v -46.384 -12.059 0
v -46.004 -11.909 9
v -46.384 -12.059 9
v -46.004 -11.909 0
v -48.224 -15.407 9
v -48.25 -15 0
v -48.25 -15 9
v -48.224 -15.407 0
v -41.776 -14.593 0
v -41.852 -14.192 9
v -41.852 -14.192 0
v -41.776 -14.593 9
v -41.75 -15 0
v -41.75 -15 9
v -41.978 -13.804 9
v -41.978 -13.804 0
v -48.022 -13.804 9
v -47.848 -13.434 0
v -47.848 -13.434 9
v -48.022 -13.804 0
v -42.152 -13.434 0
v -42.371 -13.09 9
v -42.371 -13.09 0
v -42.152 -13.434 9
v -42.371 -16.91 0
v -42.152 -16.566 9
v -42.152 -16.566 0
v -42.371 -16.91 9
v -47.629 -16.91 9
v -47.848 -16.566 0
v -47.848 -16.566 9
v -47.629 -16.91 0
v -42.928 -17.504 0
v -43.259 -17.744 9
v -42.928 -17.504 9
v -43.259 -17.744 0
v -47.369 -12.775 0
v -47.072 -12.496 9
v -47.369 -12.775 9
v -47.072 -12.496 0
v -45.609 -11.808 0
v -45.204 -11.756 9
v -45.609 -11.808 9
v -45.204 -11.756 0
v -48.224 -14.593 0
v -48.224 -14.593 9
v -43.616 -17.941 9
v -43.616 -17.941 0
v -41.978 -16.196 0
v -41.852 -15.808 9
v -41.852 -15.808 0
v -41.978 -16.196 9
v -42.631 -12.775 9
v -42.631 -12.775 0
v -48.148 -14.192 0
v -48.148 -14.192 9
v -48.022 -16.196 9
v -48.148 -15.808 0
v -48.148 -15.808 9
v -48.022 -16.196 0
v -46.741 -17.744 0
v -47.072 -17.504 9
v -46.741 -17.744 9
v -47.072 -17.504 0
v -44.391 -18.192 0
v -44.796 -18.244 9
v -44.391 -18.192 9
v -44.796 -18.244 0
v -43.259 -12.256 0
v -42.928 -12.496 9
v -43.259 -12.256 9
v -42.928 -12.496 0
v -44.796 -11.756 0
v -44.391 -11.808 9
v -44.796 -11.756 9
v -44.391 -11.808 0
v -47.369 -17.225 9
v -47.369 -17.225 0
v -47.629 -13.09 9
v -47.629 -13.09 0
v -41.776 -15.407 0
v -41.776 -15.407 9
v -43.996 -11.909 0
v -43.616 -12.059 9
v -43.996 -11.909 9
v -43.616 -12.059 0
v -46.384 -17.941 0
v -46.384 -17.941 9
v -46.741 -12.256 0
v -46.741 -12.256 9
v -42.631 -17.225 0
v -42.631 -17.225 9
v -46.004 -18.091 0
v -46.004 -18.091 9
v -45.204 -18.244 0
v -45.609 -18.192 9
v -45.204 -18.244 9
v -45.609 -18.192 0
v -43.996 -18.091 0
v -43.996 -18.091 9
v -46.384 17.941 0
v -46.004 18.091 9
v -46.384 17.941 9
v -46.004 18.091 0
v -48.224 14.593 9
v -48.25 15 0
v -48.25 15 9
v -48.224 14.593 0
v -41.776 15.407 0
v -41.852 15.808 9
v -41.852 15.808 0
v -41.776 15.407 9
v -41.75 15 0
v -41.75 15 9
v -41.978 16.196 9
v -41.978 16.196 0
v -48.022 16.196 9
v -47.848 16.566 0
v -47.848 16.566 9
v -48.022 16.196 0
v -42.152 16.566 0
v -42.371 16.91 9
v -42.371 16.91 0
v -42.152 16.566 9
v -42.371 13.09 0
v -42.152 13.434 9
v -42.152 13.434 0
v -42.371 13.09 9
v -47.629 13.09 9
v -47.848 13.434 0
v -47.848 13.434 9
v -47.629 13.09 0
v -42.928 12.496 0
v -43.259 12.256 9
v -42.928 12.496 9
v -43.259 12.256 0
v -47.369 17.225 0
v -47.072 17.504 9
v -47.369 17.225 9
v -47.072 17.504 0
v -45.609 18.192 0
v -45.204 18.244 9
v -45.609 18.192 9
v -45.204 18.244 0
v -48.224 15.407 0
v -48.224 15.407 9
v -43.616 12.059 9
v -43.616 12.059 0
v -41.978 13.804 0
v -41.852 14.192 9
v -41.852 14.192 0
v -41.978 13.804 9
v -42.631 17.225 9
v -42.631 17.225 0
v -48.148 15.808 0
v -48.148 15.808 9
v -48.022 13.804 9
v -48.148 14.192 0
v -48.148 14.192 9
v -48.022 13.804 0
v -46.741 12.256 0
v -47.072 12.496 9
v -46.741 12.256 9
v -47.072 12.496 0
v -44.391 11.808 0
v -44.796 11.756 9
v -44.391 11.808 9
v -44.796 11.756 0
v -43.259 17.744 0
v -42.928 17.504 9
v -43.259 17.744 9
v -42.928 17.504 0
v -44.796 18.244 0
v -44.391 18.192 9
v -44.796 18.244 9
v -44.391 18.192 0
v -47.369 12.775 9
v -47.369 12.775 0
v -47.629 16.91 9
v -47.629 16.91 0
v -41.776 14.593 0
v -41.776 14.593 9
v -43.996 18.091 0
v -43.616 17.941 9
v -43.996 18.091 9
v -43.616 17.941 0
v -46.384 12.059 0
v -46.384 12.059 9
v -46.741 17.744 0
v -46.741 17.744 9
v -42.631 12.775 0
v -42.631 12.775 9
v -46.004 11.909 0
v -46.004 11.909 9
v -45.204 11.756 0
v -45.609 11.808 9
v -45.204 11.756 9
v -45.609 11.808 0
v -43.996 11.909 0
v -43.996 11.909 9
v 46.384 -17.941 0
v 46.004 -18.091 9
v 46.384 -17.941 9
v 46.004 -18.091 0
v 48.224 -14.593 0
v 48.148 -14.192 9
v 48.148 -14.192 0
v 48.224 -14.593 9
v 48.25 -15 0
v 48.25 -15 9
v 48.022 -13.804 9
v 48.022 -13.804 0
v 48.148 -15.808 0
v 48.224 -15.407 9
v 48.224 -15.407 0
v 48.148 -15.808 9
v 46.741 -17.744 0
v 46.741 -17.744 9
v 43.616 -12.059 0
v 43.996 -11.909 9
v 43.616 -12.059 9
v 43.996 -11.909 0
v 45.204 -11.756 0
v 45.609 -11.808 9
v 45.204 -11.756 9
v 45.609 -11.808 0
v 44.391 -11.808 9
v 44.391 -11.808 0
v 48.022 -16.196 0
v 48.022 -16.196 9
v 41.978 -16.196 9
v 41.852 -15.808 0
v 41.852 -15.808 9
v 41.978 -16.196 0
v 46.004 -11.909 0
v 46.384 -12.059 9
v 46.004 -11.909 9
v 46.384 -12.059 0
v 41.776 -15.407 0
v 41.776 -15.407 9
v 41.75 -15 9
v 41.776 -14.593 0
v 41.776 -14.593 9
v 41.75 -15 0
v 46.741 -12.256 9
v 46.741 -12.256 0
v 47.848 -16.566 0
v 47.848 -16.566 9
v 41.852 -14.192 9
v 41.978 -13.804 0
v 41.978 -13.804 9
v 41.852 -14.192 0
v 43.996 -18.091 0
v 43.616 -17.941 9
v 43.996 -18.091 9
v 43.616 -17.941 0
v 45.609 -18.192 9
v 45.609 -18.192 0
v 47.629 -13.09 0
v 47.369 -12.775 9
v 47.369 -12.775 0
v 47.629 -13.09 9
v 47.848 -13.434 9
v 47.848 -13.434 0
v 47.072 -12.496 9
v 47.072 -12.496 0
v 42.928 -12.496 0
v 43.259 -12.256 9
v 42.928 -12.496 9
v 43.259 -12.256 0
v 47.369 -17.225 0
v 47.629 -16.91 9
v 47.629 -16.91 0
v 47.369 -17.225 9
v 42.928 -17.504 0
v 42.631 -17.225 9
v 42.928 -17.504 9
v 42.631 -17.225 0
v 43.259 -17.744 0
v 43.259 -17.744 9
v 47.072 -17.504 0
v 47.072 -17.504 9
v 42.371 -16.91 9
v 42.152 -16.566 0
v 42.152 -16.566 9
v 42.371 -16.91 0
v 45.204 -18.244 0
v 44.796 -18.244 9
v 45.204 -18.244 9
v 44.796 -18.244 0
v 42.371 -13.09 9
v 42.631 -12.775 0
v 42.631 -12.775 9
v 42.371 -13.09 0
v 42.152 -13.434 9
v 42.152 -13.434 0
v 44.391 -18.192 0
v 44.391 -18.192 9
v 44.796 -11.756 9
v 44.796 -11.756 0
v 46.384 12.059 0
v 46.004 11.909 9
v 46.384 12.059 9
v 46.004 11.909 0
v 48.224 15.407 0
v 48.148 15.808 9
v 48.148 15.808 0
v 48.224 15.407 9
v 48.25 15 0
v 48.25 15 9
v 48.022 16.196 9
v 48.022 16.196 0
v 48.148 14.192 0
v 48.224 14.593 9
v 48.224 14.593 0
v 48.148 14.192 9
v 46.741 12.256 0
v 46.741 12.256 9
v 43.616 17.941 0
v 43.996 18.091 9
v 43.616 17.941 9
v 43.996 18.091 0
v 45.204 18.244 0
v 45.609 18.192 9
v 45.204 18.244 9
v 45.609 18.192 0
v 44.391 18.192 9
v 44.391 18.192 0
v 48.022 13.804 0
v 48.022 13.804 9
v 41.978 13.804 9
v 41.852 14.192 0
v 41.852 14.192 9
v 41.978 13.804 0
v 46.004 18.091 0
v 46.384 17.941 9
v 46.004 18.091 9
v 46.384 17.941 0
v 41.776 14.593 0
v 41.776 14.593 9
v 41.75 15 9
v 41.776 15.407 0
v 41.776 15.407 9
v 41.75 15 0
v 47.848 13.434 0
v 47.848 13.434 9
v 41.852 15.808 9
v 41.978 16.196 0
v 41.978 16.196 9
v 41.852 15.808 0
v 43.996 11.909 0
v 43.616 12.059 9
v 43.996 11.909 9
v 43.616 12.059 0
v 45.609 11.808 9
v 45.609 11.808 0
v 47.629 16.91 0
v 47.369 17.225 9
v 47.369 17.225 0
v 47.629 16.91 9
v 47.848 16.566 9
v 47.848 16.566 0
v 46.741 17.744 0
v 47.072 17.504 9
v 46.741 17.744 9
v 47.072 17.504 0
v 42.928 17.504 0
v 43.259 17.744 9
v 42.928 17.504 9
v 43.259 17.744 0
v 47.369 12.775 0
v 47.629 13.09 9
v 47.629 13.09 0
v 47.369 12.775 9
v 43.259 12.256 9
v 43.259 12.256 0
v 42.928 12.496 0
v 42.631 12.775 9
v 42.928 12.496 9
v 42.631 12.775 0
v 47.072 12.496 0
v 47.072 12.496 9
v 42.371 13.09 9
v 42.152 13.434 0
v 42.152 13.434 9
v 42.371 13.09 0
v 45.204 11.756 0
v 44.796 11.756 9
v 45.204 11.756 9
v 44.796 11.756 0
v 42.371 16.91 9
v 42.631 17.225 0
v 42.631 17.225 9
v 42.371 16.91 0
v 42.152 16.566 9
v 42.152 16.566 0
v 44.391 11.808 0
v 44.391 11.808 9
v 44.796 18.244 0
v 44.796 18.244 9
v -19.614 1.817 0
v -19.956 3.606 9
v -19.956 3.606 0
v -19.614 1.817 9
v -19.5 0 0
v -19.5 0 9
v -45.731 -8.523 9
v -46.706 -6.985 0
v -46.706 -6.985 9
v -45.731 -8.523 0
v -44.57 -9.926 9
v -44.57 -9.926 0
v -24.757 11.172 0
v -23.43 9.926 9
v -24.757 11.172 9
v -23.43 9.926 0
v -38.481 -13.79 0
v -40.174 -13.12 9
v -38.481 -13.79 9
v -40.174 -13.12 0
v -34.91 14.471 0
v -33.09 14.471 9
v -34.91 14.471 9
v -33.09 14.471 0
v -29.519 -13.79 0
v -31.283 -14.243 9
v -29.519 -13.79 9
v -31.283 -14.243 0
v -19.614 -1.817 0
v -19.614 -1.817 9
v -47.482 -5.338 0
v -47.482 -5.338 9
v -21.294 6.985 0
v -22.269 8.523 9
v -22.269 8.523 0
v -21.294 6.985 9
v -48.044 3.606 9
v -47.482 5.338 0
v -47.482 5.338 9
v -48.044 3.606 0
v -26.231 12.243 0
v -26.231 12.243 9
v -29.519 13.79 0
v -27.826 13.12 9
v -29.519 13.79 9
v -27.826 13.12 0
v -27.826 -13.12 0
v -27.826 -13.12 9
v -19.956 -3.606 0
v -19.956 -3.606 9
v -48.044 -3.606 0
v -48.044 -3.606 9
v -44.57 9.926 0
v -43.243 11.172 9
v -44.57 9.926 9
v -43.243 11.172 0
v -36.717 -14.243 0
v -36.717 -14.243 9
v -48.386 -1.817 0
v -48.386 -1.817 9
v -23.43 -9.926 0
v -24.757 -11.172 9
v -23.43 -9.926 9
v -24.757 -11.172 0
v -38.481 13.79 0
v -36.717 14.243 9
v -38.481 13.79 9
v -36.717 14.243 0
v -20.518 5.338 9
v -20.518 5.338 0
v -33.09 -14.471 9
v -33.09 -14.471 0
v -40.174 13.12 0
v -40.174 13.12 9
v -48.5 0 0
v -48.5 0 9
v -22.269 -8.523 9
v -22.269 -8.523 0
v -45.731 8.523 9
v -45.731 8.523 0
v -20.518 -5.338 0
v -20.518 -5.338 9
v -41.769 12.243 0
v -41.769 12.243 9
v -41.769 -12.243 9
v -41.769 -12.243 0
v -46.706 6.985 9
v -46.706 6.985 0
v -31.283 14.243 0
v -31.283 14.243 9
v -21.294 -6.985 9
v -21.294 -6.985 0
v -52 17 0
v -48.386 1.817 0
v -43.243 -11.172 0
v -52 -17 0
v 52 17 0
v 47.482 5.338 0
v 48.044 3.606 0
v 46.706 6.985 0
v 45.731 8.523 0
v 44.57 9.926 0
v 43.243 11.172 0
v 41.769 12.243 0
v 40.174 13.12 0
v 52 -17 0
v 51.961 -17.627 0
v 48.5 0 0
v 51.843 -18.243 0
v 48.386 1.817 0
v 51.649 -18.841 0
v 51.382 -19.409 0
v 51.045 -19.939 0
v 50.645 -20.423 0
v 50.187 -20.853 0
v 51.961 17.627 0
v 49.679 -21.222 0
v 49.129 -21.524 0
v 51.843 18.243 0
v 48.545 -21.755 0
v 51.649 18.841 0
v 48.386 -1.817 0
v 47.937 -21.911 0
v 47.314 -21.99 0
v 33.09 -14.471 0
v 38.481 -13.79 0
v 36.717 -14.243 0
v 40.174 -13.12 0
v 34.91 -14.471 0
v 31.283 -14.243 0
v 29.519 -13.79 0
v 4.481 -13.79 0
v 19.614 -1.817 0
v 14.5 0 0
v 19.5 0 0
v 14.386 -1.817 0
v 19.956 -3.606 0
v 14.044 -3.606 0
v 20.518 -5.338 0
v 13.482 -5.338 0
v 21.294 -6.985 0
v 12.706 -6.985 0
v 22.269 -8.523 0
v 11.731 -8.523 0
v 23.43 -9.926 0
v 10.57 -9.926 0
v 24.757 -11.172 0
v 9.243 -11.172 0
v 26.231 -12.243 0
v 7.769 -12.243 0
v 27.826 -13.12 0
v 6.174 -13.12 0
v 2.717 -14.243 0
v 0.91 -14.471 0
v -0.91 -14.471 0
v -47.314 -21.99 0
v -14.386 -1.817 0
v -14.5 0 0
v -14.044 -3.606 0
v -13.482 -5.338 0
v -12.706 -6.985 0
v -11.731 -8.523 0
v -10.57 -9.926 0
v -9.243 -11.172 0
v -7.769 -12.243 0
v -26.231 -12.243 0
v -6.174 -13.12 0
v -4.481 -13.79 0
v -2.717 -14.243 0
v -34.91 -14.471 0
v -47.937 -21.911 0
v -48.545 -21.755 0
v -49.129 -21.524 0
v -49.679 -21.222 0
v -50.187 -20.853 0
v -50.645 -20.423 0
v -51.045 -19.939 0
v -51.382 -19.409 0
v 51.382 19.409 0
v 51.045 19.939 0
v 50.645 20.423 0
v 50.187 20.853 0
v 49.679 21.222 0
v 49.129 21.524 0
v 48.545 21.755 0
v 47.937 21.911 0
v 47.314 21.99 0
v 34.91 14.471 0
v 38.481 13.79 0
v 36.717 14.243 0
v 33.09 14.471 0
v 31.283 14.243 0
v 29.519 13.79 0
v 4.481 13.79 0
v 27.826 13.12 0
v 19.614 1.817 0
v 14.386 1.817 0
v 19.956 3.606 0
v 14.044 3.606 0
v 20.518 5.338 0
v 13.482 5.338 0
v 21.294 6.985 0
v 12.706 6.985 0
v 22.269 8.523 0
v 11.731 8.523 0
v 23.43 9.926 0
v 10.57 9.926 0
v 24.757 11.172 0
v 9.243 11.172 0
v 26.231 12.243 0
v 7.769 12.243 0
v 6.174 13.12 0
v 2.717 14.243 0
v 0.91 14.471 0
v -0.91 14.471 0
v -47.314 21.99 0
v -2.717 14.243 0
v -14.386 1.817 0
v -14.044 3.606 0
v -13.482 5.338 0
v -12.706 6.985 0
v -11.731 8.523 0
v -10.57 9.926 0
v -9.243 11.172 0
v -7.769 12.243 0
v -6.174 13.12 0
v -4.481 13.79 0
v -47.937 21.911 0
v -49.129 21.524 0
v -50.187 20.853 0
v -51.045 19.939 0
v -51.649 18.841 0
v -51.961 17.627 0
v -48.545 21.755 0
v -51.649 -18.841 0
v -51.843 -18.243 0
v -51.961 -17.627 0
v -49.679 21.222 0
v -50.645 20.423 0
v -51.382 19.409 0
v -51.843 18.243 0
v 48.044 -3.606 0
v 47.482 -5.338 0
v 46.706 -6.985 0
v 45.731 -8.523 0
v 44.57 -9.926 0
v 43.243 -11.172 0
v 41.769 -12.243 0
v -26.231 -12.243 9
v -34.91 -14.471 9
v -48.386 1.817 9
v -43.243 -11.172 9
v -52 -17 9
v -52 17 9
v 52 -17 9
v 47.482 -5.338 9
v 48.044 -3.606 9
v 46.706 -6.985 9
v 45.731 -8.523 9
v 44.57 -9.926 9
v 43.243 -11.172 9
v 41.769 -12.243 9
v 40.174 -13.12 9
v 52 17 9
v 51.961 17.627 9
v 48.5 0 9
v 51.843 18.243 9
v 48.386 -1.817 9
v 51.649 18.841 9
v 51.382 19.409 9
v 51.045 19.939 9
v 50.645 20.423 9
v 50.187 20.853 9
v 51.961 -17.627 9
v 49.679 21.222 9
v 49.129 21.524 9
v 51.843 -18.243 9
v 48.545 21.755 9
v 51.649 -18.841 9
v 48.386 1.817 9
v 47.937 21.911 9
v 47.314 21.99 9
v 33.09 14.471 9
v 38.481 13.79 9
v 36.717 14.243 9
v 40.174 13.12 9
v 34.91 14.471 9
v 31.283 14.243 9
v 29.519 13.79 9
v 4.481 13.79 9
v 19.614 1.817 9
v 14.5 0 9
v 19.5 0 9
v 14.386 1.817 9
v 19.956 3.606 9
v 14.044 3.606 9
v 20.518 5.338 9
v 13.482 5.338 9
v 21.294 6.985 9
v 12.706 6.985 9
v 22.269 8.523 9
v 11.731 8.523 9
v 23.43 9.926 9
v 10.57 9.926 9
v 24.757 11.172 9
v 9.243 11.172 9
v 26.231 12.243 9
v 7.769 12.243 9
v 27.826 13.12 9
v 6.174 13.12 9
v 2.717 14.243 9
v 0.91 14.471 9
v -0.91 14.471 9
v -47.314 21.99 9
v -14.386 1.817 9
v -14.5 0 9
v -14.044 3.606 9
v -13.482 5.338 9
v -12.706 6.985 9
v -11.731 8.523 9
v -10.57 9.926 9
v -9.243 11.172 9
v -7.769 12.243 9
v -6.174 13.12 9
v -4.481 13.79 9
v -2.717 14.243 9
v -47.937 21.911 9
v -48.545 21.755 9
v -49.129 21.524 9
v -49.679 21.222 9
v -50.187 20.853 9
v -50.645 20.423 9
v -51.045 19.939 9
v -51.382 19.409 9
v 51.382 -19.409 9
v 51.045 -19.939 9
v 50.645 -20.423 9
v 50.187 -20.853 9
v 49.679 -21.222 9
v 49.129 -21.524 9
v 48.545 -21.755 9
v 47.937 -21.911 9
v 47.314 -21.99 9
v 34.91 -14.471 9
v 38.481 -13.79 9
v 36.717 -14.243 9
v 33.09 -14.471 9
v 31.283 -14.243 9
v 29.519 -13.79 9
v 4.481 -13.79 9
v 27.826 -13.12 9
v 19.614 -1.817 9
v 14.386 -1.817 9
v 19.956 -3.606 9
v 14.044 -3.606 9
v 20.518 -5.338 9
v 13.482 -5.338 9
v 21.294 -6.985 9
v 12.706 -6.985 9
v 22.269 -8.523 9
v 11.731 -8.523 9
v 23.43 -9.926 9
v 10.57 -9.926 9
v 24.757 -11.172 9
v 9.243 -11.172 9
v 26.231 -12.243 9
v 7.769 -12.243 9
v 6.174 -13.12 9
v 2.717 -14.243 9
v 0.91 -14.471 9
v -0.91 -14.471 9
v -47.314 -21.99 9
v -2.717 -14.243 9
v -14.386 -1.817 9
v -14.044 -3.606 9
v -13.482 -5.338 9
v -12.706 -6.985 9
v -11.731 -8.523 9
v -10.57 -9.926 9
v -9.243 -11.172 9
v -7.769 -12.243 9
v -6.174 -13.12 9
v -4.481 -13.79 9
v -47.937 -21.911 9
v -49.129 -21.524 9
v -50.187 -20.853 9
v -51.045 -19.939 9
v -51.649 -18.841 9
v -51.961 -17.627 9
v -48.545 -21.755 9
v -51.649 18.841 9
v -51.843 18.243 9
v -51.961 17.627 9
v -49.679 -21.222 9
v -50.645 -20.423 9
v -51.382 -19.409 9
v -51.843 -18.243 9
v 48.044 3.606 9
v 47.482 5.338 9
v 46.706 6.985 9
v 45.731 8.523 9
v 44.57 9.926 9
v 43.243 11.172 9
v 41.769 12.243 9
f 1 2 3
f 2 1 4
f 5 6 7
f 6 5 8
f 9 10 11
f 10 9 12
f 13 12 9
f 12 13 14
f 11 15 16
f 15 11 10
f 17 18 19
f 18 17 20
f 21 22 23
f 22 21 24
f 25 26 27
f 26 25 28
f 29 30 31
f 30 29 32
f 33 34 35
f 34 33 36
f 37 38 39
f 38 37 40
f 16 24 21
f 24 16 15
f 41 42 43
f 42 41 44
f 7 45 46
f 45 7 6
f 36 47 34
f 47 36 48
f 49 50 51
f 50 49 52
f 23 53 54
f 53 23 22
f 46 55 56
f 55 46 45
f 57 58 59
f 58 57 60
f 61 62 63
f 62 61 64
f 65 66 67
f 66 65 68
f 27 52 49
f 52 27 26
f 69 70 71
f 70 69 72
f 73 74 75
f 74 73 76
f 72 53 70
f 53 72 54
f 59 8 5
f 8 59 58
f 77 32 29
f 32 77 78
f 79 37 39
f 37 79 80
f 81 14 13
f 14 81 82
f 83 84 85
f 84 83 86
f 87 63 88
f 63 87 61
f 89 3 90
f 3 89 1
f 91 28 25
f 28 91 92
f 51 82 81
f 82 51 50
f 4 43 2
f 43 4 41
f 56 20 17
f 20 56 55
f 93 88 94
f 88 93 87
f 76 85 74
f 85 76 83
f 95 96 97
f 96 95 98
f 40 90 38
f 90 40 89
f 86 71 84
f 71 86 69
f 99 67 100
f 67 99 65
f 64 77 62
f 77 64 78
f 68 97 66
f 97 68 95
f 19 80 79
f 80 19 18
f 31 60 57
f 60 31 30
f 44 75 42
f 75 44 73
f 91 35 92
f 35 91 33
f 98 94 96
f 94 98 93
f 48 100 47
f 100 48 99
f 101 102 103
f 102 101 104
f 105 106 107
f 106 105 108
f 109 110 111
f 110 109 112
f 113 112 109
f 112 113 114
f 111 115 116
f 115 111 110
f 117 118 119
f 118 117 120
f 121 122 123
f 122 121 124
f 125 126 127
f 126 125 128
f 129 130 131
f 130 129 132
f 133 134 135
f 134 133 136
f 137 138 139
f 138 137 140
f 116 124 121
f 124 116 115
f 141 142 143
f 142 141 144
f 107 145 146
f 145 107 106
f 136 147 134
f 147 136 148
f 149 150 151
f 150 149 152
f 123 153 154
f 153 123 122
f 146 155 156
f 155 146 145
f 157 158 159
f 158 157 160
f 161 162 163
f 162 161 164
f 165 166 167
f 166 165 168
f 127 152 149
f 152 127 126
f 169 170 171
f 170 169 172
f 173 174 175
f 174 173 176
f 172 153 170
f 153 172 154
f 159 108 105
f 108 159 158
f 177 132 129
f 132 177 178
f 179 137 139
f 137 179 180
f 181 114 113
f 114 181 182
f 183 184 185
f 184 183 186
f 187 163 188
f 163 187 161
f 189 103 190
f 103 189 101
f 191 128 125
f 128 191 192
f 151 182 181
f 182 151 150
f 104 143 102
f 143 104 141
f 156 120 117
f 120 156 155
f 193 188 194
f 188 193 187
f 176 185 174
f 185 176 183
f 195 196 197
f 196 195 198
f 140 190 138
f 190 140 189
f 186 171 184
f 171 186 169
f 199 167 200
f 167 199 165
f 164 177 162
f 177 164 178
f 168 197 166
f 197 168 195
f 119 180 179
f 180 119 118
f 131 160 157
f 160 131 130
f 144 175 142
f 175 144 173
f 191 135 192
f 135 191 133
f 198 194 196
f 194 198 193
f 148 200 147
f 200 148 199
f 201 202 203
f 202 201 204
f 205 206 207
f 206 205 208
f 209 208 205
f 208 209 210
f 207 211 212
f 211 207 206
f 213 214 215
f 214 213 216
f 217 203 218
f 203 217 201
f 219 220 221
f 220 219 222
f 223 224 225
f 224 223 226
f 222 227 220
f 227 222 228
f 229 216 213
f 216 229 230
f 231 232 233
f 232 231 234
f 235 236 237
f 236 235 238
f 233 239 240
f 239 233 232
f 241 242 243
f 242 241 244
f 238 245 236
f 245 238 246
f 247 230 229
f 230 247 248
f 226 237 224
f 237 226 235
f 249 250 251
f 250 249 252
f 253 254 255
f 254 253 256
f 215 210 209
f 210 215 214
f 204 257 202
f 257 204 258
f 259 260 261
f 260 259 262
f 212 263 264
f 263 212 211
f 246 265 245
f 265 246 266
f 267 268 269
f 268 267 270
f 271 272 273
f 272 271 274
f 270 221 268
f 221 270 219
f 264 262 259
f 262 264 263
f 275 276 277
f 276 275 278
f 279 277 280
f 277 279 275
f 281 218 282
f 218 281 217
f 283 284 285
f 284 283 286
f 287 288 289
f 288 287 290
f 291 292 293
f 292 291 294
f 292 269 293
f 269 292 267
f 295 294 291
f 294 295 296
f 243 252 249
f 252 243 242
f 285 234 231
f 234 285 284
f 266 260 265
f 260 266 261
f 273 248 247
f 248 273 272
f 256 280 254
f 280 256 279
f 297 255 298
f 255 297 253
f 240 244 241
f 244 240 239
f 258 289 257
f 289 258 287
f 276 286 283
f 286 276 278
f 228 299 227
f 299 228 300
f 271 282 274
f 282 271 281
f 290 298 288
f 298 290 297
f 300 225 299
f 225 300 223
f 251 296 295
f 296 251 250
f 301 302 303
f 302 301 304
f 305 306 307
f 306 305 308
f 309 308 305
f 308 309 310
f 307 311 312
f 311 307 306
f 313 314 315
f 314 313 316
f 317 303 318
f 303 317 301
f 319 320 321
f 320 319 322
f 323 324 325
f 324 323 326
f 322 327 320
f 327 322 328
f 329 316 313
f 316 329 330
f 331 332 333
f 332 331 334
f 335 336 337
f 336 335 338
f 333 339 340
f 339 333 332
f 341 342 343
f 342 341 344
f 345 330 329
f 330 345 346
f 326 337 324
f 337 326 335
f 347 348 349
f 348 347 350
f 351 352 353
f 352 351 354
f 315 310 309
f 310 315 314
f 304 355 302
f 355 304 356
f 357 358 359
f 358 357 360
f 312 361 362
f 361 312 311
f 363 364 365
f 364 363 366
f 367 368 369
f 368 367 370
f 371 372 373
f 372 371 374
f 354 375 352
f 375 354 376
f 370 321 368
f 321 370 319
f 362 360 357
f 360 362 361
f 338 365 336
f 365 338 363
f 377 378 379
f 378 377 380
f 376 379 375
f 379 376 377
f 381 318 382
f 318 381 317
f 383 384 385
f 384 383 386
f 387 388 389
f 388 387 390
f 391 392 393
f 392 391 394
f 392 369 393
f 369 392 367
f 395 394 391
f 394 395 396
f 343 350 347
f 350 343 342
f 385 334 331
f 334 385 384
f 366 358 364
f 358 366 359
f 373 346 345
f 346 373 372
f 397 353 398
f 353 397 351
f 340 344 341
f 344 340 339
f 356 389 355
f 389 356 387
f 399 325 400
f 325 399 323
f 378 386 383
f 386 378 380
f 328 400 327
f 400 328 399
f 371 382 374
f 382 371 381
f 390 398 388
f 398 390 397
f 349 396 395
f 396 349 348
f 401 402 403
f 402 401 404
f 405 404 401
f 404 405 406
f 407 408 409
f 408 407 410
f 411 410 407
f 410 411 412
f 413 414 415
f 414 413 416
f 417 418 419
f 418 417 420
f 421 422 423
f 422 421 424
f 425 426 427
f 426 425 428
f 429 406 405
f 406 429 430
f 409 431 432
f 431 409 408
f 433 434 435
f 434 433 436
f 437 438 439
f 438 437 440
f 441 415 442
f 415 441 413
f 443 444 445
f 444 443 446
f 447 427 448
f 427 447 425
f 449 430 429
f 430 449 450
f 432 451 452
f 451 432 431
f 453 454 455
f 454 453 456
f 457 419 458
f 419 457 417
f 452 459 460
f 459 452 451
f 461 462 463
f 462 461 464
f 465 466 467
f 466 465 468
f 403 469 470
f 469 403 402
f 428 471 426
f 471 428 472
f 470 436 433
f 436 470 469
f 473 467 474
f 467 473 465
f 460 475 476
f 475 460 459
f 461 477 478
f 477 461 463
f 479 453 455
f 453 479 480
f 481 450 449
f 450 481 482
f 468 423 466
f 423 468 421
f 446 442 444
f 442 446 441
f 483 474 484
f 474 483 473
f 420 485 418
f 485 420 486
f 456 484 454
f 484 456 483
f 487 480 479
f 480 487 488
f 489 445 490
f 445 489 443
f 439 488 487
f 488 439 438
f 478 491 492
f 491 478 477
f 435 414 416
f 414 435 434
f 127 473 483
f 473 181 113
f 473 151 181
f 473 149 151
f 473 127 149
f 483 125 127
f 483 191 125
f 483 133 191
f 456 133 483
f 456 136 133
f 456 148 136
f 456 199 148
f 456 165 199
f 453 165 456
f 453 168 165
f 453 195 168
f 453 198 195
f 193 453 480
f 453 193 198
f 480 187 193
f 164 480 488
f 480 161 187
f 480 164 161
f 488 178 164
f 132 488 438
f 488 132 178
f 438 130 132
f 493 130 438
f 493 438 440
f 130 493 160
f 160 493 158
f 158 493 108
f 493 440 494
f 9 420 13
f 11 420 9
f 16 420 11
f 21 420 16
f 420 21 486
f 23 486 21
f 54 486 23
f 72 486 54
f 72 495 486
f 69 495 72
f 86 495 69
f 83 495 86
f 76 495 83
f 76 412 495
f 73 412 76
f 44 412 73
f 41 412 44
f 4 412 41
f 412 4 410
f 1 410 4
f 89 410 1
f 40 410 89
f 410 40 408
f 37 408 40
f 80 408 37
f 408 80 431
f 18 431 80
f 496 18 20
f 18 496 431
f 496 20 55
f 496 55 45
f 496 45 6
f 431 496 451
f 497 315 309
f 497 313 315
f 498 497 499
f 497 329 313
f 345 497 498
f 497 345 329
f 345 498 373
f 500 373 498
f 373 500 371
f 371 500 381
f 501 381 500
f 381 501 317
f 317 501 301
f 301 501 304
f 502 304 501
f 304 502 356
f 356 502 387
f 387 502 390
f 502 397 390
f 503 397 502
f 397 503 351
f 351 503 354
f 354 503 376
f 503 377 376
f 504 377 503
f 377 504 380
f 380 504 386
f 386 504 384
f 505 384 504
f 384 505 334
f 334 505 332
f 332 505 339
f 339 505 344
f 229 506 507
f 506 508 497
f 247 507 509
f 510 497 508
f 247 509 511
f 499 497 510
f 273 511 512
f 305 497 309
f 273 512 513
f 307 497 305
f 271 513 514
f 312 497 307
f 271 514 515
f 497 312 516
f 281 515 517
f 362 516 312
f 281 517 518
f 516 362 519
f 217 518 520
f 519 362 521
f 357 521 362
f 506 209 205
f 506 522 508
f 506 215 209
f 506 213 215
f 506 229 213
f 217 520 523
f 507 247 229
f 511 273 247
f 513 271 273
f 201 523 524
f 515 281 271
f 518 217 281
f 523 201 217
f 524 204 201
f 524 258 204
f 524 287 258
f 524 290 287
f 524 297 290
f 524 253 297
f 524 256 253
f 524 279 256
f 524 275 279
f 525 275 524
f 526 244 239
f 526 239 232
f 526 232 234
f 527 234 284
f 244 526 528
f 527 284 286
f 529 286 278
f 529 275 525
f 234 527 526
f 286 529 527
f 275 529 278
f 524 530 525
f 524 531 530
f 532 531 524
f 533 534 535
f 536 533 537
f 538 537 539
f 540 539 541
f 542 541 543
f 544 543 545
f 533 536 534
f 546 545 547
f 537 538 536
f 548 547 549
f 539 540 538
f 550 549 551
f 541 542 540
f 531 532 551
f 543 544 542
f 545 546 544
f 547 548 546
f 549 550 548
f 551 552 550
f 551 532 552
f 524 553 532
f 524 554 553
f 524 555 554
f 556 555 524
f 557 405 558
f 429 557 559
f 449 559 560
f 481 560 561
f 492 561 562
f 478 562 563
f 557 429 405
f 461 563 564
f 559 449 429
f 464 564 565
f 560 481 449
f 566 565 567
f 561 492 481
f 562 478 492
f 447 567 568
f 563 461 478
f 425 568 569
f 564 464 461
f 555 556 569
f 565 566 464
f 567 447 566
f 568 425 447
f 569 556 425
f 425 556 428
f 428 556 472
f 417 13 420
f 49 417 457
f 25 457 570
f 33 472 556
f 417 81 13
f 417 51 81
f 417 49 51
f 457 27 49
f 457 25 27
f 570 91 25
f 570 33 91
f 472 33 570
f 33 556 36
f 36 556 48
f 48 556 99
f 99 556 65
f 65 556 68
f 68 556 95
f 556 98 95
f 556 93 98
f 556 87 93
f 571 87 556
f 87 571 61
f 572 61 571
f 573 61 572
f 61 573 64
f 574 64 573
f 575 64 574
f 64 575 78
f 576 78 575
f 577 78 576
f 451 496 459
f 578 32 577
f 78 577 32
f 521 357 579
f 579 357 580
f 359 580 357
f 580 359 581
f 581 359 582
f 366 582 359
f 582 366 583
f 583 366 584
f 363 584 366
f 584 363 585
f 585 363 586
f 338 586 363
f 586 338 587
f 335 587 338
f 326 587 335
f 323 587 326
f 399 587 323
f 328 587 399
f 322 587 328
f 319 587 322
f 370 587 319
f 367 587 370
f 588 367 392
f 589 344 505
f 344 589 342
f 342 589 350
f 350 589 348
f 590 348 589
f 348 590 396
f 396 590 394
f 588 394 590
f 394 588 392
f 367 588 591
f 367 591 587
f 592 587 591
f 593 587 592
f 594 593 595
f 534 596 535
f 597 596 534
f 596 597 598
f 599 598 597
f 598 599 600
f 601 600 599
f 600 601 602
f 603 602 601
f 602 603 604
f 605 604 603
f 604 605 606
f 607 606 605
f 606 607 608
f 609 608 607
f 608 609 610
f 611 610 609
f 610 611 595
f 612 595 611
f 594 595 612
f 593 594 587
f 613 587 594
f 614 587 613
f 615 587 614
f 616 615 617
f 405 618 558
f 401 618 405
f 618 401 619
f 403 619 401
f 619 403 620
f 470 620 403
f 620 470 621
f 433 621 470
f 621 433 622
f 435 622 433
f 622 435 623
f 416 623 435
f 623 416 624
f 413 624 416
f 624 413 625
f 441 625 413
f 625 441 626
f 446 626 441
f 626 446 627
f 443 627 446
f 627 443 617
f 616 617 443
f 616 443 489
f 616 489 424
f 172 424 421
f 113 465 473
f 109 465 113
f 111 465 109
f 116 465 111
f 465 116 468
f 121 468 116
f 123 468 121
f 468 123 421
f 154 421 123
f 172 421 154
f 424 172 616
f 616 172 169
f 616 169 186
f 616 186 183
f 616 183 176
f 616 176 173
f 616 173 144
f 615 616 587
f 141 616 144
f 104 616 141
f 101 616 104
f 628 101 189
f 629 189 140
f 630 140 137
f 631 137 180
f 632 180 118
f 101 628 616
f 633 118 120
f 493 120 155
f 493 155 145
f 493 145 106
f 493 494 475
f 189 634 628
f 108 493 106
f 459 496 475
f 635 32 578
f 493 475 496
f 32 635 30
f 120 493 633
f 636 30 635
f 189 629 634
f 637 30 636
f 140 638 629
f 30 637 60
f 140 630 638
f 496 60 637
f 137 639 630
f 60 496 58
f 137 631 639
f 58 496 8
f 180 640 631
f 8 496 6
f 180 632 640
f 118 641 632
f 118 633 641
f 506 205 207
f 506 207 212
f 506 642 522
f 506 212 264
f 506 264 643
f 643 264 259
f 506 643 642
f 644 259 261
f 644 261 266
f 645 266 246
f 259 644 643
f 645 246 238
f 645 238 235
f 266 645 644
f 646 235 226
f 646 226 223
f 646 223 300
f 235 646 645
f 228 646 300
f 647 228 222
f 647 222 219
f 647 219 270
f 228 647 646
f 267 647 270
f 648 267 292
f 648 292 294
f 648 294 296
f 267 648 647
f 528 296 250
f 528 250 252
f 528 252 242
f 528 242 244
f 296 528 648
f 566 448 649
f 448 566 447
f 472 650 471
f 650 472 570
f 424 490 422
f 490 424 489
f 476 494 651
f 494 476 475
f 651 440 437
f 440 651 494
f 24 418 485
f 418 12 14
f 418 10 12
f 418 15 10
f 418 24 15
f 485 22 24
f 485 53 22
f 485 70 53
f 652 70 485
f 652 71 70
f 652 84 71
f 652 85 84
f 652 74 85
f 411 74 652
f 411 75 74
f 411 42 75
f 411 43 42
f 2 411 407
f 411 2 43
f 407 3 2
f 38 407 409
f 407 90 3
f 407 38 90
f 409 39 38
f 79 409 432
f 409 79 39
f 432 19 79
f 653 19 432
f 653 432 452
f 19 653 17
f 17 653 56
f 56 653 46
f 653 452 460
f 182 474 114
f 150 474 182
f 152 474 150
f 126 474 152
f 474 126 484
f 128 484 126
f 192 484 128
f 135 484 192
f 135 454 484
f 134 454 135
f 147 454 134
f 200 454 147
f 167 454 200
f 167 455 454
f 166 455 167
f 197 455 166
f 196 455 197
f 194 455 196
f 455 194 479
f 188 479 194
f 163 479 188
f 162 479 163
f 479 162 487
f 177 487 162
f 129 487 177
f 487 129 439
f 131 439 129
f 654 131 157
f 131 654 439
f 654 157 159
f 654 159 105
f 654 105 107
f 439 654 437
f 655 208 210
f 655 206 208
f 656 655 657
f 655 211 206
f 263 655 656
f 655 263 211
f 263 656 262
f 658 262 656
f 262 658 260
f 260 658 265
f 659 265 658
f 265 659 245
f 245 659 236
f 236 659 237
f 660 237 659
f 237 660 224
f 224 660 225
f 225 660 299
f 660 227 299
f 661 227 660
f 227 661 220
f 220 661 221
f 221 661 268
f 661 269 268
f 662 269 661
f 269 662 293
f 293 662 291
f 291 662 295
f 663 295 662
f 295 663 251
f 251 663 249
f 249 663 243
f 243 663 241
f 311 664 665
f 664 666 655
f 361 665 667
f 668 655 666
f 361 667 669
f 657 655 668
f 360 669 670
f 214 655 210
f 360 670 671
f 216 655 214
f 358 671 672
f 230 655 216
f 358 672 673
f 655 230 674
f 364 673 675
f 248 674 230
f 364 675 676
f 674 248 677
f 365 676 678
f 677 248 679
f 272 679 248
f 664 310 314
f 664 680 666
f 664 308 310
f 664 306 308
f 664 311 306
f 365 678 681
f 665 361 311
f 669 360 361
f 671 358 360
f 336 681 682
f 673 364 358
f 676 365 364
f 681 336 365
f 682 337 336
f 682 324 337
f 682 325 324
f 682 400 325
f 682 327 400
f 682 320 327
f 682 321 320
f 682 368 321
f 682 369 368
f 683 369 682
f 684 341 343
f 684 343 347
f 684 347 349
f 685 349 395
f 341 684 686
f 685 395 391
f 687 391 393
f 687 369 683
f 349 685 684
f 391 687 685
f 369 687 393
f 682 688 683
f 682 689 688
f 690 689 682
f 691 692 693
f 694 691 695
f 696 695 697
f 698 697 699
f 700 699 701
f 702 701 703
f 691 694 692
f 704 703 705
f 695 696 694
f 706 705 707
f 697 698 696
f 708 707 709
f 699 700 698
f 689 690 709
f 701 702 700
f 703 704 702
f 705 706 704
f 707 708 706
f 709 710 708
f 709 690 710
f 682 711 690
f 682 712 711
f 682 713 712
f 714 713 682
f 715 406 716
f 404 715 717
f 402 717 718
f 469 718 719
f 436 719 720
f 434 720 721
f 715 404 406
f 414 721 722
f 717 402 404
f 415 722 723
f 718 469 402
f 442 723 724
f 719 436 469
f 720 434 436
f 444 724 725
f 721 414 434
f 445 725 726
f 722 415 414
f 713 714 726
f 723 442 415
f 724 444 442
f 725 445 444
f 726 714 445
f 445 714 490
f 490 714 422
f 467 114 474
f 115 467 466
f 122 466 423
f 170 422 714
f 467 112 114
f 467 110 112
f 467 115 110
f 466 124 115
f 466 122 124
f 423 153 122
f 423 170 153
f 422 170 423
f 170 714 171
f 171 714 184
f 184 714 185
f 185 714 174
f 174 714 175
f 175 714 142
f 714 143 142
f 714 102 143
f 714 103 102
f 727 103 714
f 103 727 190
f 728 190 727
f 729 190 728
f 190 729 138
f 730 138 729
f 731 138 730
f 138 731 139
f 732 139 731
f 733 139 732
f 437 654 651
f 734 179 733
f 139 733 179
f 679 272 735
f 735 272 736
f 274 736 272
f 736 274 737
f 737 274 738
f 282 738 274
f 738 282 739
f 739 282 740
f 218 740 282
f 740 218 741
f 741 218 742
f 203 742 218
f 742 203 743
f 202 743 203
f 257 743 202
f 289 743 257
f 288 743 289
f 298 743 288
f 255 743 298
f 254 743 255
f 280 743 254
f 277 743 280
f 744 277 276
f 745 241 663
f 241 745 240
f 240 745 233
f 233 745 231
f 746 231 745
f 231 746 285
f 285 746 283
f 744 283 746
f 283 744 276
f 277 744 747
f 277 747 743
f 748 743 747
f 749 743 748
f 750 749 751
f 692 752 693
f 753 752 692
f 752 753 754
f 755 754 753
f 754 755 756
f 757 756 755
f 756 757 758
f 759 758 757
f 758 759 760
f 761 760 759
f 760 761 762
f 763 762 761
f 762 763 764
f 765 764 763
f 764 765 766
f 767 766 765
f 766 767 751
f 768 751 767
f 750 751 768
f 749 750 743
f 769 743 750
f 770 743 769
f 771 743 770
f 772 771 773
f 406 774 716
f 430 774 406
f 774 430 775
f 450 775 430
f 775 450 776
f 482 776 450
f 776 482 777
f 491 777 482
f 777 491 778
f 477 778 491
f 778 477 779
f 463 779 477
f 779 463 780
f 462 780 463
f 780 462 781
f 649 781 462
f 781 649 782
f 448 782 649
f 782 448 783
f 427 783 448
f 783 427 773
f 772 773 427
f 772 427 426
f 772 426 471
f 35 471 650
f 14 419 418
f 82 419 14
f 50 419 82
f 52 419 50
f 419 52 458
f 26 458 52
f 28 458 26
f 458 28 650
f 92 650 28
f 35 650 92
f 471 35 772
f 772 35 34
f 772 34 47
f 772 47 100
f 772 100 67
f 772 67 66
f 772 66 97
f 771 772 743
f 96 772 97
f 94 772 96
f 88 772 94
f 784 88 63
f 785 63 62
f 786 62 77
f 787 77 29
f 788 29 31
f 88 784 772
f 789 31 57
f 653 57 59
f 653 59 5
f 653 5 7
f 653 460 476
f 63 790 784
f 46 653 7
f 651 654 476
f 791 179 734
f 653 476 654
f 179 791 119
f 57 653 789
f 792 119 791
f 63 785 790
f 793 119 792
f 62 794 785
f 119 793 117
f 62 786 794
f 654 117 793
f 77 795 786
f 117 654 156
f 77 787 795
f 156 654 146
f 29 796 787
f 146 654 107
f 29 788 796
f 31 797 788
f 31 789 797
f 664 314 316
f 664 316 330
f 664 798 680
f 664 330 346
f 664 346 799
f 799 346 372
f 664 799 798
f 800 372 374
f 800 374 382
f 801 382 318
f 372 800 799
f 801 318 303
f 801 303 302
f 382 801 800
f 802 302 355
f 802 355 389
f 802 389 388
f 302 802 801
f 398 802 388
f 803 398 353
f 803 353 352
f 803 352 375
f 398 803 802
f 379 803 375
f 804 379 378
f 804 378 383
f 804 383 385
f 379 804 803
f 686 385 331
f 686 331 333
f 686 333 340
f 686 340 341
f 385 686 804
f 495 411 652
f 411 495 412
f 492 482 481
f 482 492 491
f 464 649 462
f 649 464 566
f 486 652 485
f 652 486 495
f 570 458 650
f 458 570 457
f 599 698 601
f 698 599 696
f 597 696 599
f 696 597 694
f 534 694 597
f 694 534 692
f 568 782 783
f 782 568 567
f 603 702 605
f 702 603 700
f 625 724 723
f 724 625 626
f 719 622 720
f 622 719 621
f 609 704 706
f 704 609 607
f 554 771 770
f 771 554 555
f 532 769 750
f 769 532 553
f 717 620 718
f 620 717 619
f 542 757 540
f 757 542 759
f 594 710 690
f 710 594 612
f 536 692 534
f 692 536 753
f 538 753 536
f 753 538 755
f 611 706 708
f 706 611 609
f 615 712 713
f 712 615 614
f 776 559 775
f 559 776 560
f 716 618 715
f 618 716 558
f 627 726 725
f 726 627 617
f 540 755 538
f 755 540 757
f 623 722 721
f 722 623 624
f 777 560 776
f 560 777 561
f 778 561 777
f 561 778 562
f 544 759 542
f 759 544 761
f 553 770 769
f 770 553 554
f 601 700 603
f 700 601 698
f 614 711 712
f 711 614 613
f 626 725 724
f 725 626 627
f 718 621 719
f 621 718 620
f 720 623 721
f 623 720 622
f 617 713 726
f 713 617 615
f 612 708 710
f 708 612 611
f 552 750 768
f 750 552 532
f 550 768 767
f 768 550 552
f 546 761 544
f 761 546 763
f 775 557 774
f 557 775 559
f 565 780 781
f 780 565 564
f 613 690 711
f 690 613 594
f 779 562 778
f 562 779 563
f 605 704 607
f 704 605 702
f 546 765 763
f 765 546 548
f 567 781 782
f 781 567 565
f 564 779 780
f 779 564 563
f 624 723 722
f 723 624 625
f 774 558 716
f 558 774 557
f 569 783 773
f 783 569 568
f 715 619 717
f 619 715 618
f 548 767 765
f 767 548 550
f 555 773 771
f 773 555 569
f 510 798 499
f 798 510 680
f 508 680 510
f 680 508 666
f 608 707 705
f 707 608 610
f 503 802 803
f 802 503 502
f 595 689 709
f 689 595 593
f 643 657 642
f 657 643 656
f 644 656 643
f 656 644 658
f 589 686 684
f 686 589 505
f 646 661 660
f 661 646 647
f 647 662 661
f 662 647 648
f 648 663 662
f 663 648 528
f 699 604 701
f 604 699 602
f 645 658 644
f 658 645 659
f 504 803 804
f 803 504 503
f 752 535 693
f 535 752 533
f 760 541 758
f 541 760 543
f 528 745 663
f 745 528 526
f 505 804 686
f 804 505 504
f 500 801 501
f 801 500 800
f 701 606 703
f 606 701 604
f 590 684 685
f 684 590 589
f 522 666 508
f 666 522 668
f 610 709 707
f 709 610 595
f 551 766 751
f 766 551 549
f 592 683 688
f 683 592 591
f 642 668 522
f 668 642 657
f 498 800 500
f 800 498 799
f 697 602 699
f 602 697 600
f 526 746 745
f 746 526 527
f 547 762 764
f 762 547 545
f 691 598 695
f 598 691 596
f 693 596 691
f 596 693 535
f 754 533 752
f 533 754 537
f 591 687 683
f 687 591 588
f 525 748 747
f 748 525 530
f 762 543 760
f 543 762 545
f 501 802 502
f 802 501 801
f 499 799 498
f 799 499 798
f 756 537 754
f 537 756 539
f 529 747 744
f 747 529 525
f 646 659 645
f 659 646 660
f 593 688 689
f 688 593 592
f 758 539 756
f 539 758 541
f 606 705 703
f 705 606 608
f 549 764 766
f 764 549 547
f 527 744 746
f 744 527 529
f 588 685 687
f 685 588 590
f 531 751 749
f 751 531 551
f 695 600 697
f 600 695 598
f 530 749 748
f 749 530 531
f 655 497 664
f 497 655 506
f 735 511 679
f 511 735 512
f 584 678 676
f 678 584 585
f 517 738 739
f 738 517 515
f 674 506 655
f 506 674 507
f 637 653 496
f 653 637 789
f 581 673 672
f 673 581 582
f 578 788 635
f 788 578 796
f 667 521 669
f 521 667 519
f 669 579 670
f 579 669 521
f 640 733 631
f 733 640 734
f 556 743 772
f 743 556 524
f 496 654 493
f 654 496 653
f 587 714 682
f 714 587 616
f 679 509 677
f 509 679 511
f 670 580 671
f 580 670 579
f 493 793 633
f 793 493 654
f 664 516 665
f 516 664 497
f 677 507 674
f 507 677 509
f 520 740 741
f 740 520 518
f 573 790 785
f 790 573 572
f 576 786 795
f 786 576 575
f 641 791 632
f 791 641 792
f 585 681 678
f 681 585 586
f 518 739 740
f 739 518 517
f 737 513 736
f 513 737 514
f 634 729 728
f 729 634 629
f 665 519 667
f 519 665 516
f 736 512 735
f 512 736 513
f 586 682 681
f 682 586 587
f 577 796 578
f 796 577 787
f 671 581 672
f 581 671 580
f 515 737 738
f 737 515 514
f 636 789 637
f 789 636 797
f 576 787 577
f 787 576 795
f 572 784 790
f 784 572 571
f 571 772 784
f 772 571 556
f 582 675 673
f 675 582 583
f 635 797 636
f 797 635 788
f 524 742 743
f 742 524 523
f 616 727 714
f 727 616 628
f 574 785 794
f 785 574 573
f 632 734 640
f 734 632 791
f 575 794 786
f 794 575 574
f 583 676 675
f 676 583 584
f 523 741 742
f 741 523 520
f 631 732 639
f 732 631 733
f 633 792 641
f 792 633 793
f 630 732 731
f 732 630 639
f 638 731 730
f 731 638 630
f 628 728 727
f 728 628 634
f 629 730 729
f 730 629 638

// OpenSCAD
$fn = 50;


difference() {
	union() {
		hull() {
			translate(v = [-47.0000000000, 17.0000000000, 0]) {
				cylinder(h = 9, r = 5);
			}
			translate(v = [47.0000000000, 17.0000000000, 0]) {
				cylinder(h = 9, r = 5);
			}
			translate(v = [-47.0000000000, -17.0000000000, 0]) {
				cylinder(h = 9, r = 5);
			}
			translate(v = [47.0000000000, -17.0000000000, 0]) {
				cylinder(h = 9, r = 5);
			}
		}
	}
	union() {
		#translate(v = [-45.0000000000, -15.0000000000, -100.0000000000]) {
			cylinder(h = 200, r = 3.2500000000);
		}
		#translate(v = [-45.0000000000, 15.0000000000, -100.0000000000]) {
			cylinder(h = 200, r = 3.2500000000);
		}
		#translate(v = [45.0000000000, -15.0000000000, -100.0000000000]) {
			cylinder(h = 200, r = 3.2500000000);
		}
		#translate(v = [45.0000000000, 15.0000000000, -100.0000000000]) {
			cylinder(h = 200, r = 3.2500000000);
		}
		#translate(v = [-34.0000000000, 0, 0]) {
			cylinder(h = 9, r = 14.5000000000);
		}
		#cylinder(h = 9, r = 14.5000000000);
		#translate(v = [34.0000000000, 0, 0]) {
			cylinder(h = 9, r = 14.5000000000);
		}
	}
}
